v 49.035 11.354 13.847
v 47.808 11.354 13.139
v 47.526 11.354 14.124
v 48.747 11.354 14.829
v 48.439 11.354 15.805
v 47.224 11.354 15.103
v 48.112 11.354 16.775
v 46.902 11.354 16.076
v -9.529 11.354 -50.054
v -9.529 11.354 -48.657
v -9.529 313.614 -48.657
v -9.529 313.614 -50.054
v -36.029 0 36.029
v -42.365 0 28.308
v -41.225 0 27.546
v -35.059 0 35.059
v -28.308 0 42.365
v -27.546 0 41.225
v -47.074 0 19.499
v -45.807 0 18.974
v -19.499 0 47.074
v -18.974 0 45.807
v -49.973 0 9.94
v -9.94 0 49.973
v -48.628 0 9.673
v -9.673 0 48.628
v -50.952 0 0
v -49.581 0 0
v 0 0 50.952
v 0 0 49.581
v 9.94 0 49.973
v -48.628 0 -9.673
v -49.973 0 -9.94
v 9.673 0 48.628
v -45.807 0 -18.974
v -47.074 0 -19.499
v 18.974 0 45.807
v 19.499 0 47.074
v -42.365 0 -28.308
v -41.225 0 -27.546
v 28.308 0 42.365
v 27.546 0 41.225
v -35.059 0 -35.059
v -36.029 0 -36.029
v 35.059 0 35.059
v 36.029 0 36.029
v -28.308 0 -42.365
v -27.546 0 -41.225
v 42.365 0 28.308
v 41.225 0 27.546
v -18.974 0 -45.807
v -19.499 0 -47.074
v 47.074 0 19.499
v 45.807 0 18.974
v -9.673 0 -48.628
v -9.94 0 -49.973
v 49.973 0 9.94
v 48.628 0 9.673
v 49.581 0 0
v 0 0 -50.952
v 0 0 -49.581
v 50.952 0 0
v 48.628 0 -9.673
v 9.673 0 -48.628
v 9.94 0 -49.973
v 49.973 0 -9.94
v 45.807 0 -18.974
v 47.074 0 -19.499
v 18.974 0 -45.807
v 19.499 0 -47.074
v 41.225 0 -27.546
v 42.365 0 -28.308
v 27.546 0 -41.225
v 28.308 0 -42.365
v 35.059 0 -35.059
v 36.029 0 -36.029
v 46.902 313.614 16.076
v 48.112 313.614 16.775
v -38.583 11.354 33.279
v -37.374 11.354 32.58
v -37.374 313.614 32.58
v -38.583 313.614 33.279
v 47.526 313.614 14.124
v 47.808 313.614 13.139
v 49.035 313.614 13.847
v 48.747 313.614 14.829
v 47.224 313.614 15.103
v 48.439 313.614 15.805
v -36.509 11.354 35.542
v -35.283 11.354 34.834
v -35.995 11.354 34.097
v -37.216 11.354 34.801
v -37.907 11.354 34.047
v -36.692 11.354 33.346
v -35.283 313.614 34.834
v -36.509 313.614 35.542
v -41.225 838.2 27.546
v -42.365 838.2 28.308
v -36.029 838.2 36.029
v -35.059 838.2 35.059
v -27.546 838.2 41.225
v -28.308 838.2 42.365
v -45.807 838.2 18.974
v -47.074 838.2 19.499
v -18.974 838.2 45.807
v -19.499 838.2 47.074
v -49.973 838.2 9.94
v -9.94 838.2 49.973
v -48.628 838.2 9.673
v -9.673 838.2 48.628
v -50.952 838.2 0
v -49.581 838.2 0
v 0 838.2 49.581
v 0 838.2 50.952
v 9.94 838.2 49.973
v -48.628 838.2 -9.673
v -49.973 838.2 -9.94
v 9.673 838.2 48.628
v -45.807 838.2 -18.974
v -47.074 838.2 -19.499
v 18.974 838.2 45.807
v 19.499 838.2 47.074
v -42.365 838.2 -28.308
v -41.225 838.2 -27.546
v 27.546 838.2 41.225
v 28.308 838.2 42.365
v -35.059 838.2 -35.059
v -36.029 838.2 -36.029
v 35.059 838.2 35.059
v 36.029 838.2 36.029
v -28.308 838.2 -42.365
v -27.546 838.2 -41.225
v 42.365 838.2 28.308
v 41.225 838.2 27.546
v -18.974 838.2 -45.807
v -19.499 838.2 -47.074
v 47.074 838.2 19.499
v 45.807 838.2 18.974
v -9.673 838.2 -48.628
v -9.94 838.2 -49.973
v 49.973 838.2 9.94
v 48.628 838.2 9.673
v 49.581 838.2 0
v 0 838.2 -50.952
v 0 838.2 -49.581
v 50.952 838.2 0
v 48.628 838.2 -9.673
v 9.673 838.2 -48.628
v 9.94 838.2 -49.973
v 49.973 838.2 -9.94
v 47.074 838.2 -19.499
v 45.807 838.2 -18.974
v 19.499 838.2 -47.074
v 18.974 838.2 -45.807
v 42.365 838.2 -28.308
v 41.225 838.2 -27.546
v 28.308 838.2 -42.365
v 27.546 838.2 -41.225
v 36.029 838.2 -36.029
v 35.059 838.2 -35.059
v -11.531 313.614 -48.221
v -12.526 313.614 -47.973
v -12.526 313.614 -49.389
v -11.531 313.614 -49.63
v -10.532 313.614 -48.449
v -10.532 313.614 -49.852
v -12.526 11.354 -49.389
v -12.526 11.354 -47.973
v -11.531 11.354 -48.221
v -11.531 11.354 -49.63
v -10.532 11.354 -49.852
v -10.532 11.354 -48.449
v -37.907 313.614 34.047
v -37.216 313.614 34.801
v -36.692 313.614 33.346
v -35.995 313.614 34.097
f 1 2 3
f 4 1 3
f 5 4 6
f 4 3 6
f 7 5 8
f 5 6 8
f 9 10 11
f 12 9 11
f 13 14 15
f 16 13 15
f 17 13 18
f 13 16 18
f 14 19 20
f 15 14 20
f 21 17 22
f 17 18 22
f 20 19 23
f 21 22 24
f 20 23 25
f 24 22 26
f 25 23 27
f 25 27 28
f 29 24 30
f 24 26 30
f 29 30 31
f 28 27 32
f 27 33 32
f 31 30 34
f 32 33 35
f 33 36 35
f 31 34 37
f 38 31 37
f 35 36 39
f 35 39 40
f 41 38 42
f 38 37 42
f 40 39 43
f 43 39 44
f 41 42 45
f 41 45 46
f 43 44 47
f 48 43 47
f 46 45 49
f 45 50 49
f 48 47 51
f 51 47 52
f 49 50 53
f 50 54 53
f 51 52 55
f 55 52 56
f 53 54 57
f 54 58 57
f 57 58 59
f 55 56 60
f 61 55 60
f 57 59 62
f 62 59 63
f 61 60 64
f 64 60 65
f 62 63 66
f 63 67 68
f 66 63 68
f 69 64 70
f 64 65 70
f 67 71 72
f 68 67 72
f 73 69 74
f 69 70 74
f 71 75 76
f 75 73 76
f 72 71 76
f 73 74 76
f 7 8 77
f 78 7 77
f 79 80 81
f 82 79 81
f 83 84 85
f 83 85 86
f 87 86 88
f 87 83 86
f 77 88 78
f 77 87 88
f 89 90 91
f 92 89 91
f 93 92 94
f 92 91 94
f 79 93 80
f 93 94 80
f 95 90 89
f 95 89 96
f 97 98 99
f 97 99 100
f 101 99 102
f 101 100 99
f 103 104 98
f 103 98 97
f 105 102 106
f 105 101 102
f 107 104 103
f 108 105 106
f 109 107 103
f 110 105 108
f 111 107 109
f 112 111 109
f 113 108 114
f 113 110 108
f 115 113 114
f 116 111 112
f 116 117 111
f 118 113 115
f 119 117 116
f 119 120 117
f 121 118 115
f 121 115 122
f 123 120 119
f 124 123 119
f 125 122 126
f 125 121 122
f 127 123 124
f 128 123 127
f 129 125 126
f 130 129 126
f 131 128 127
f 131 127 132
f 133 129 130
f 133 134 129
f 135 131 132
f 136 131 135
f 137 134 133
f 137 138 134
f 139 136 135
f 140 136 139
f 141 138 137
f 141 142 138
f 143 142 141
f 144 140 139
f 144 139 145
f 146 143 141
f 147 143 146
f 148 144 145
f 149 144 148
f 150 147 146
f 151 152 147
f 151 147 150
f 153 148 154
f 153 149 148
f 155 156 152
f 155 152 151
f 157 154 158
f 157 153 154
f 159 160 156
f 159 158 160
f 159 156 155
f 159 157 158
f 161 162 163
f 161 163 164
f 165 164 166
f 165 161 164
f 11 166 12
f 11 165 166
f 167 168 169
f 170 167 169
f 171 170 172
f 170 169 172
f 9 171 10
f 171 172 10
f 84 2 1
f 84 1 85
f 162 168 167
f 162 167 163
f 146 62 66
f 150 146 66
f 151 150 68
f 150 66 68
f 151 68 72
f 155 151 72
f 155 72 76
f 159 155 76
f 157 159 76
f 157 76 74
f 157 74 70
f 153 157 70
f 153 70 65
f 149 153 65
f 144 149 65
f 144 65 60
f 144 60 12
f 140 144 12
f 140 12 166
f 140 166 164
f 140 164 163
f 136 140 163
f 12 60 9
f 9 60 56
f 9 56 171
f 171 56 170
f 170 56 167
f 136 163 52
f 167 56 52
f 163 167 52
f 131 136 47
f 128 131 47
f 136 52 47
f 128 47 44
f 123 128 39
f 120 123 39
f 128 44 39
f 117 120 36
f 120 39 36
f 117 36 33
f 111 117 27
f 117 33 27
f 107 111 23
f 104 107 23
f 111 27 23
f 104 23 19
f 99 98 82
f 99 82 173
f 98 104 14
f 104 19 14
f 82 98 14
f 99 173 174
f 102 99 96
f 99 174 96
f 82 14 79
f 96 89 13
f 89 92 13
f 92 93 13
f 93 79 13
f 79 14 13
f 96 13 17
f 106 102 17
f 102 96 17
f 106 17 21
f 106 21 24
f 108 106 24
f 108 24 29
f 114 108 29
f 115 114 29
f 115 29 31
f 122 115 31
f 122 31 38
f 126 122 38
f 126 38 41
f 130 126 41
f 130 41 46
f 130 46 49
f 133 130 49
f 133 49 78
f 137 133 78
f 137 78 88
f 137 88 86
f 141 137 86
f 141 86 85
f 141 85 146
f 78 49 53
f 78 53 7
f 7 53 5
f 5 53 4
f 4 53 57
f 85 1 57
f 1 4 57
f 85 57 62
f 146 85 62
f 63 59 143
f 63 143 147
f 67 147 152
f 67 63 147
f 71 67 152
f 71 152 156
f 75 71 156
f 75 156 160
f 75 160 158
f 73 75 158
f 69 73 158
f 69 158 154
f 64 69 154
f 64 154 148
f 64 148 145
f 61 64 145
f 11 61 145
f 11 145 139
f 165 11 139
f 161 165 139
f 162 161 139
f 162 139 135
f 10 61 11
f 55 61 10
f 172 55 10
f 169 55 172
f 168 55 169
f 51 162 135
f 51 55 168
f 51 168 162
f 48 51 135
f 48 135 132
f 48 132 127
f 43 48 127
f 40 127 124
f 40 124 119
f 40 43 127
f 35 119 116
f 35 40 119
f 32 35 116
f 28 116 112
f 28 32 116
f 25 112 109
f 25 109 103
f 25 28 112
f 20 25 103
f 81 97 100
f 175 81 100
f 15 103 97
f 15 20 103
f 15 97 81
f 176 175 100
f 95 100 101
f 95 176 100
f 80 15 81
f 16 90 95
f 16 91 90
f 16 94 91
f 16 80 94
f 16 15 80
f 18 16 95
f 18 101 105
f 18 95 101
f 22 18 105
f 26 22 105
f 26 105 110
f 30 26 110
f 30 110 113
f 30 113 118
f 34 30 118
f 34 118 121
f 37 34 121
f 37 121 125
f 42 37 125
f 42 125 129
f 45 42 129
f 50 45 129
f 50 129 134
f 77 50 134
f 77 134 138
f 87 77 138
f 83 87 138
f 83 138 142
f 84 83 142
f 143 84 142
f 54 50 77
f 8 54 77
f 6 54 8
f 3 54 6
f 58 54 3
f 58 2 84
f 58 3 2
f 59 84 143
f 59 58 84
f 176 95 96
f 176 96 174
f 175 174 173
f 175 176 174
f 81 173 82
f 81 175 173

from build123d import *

# Parameters (mm, degrees)
SKETCH2_R           = 50.9524
SKETCH2_R_2         = 49.5808
BOSS_EXTRUDE1_DEPTH = 838.2
SKETCH3_W           = 2.9972
SKETCH3_H           = 302.26
CUT_EXTRUDE1_DEPTH  = 51.9524
CIRPATTERN2_COUNT   = 3


with BuildPart() as part:
    # Sketch2 → Boss-Extrude1 (new body)
    with BuildSketch(Plane(origin=(0, 0, 0), x_dir=(1, 0, 0), z_dir=(0, 1, 0))):
        Circle(SKETCH2_R)
        Circle(SKETCH2_R_2, mode=Mode.SUBTRACT)
    extrude(amount=BOSS_EXTRUDE1_DEPTH)

    # Sketch3 → Cut-Extrude1 (cut, through all)
    with BuildSketch(Plane.XY):
        with Locations((-11.027101343, 162.4838)):
            Rectangle(SKETCH3_W, SKETCH3_H)
    cut_extrude1 = extrude(amount=-CUT_EXTRUDE1_DEPTH, mode=Mode.SUBTRACT)

    # CirPattern2: Cut-Extrude1 ×3 about axis
    cirpattern2_axis = Axis((0, 0, 0), (0, 1, 0))
    for i in range(1, CIRPATTERN2_COUNT):
        add(cut_extrude1.rotate(cirpattern2_axis, i * 360 / CIRPATTERN2_COUNT), mode=Mode.SUBTRACT)


solid = part.part
